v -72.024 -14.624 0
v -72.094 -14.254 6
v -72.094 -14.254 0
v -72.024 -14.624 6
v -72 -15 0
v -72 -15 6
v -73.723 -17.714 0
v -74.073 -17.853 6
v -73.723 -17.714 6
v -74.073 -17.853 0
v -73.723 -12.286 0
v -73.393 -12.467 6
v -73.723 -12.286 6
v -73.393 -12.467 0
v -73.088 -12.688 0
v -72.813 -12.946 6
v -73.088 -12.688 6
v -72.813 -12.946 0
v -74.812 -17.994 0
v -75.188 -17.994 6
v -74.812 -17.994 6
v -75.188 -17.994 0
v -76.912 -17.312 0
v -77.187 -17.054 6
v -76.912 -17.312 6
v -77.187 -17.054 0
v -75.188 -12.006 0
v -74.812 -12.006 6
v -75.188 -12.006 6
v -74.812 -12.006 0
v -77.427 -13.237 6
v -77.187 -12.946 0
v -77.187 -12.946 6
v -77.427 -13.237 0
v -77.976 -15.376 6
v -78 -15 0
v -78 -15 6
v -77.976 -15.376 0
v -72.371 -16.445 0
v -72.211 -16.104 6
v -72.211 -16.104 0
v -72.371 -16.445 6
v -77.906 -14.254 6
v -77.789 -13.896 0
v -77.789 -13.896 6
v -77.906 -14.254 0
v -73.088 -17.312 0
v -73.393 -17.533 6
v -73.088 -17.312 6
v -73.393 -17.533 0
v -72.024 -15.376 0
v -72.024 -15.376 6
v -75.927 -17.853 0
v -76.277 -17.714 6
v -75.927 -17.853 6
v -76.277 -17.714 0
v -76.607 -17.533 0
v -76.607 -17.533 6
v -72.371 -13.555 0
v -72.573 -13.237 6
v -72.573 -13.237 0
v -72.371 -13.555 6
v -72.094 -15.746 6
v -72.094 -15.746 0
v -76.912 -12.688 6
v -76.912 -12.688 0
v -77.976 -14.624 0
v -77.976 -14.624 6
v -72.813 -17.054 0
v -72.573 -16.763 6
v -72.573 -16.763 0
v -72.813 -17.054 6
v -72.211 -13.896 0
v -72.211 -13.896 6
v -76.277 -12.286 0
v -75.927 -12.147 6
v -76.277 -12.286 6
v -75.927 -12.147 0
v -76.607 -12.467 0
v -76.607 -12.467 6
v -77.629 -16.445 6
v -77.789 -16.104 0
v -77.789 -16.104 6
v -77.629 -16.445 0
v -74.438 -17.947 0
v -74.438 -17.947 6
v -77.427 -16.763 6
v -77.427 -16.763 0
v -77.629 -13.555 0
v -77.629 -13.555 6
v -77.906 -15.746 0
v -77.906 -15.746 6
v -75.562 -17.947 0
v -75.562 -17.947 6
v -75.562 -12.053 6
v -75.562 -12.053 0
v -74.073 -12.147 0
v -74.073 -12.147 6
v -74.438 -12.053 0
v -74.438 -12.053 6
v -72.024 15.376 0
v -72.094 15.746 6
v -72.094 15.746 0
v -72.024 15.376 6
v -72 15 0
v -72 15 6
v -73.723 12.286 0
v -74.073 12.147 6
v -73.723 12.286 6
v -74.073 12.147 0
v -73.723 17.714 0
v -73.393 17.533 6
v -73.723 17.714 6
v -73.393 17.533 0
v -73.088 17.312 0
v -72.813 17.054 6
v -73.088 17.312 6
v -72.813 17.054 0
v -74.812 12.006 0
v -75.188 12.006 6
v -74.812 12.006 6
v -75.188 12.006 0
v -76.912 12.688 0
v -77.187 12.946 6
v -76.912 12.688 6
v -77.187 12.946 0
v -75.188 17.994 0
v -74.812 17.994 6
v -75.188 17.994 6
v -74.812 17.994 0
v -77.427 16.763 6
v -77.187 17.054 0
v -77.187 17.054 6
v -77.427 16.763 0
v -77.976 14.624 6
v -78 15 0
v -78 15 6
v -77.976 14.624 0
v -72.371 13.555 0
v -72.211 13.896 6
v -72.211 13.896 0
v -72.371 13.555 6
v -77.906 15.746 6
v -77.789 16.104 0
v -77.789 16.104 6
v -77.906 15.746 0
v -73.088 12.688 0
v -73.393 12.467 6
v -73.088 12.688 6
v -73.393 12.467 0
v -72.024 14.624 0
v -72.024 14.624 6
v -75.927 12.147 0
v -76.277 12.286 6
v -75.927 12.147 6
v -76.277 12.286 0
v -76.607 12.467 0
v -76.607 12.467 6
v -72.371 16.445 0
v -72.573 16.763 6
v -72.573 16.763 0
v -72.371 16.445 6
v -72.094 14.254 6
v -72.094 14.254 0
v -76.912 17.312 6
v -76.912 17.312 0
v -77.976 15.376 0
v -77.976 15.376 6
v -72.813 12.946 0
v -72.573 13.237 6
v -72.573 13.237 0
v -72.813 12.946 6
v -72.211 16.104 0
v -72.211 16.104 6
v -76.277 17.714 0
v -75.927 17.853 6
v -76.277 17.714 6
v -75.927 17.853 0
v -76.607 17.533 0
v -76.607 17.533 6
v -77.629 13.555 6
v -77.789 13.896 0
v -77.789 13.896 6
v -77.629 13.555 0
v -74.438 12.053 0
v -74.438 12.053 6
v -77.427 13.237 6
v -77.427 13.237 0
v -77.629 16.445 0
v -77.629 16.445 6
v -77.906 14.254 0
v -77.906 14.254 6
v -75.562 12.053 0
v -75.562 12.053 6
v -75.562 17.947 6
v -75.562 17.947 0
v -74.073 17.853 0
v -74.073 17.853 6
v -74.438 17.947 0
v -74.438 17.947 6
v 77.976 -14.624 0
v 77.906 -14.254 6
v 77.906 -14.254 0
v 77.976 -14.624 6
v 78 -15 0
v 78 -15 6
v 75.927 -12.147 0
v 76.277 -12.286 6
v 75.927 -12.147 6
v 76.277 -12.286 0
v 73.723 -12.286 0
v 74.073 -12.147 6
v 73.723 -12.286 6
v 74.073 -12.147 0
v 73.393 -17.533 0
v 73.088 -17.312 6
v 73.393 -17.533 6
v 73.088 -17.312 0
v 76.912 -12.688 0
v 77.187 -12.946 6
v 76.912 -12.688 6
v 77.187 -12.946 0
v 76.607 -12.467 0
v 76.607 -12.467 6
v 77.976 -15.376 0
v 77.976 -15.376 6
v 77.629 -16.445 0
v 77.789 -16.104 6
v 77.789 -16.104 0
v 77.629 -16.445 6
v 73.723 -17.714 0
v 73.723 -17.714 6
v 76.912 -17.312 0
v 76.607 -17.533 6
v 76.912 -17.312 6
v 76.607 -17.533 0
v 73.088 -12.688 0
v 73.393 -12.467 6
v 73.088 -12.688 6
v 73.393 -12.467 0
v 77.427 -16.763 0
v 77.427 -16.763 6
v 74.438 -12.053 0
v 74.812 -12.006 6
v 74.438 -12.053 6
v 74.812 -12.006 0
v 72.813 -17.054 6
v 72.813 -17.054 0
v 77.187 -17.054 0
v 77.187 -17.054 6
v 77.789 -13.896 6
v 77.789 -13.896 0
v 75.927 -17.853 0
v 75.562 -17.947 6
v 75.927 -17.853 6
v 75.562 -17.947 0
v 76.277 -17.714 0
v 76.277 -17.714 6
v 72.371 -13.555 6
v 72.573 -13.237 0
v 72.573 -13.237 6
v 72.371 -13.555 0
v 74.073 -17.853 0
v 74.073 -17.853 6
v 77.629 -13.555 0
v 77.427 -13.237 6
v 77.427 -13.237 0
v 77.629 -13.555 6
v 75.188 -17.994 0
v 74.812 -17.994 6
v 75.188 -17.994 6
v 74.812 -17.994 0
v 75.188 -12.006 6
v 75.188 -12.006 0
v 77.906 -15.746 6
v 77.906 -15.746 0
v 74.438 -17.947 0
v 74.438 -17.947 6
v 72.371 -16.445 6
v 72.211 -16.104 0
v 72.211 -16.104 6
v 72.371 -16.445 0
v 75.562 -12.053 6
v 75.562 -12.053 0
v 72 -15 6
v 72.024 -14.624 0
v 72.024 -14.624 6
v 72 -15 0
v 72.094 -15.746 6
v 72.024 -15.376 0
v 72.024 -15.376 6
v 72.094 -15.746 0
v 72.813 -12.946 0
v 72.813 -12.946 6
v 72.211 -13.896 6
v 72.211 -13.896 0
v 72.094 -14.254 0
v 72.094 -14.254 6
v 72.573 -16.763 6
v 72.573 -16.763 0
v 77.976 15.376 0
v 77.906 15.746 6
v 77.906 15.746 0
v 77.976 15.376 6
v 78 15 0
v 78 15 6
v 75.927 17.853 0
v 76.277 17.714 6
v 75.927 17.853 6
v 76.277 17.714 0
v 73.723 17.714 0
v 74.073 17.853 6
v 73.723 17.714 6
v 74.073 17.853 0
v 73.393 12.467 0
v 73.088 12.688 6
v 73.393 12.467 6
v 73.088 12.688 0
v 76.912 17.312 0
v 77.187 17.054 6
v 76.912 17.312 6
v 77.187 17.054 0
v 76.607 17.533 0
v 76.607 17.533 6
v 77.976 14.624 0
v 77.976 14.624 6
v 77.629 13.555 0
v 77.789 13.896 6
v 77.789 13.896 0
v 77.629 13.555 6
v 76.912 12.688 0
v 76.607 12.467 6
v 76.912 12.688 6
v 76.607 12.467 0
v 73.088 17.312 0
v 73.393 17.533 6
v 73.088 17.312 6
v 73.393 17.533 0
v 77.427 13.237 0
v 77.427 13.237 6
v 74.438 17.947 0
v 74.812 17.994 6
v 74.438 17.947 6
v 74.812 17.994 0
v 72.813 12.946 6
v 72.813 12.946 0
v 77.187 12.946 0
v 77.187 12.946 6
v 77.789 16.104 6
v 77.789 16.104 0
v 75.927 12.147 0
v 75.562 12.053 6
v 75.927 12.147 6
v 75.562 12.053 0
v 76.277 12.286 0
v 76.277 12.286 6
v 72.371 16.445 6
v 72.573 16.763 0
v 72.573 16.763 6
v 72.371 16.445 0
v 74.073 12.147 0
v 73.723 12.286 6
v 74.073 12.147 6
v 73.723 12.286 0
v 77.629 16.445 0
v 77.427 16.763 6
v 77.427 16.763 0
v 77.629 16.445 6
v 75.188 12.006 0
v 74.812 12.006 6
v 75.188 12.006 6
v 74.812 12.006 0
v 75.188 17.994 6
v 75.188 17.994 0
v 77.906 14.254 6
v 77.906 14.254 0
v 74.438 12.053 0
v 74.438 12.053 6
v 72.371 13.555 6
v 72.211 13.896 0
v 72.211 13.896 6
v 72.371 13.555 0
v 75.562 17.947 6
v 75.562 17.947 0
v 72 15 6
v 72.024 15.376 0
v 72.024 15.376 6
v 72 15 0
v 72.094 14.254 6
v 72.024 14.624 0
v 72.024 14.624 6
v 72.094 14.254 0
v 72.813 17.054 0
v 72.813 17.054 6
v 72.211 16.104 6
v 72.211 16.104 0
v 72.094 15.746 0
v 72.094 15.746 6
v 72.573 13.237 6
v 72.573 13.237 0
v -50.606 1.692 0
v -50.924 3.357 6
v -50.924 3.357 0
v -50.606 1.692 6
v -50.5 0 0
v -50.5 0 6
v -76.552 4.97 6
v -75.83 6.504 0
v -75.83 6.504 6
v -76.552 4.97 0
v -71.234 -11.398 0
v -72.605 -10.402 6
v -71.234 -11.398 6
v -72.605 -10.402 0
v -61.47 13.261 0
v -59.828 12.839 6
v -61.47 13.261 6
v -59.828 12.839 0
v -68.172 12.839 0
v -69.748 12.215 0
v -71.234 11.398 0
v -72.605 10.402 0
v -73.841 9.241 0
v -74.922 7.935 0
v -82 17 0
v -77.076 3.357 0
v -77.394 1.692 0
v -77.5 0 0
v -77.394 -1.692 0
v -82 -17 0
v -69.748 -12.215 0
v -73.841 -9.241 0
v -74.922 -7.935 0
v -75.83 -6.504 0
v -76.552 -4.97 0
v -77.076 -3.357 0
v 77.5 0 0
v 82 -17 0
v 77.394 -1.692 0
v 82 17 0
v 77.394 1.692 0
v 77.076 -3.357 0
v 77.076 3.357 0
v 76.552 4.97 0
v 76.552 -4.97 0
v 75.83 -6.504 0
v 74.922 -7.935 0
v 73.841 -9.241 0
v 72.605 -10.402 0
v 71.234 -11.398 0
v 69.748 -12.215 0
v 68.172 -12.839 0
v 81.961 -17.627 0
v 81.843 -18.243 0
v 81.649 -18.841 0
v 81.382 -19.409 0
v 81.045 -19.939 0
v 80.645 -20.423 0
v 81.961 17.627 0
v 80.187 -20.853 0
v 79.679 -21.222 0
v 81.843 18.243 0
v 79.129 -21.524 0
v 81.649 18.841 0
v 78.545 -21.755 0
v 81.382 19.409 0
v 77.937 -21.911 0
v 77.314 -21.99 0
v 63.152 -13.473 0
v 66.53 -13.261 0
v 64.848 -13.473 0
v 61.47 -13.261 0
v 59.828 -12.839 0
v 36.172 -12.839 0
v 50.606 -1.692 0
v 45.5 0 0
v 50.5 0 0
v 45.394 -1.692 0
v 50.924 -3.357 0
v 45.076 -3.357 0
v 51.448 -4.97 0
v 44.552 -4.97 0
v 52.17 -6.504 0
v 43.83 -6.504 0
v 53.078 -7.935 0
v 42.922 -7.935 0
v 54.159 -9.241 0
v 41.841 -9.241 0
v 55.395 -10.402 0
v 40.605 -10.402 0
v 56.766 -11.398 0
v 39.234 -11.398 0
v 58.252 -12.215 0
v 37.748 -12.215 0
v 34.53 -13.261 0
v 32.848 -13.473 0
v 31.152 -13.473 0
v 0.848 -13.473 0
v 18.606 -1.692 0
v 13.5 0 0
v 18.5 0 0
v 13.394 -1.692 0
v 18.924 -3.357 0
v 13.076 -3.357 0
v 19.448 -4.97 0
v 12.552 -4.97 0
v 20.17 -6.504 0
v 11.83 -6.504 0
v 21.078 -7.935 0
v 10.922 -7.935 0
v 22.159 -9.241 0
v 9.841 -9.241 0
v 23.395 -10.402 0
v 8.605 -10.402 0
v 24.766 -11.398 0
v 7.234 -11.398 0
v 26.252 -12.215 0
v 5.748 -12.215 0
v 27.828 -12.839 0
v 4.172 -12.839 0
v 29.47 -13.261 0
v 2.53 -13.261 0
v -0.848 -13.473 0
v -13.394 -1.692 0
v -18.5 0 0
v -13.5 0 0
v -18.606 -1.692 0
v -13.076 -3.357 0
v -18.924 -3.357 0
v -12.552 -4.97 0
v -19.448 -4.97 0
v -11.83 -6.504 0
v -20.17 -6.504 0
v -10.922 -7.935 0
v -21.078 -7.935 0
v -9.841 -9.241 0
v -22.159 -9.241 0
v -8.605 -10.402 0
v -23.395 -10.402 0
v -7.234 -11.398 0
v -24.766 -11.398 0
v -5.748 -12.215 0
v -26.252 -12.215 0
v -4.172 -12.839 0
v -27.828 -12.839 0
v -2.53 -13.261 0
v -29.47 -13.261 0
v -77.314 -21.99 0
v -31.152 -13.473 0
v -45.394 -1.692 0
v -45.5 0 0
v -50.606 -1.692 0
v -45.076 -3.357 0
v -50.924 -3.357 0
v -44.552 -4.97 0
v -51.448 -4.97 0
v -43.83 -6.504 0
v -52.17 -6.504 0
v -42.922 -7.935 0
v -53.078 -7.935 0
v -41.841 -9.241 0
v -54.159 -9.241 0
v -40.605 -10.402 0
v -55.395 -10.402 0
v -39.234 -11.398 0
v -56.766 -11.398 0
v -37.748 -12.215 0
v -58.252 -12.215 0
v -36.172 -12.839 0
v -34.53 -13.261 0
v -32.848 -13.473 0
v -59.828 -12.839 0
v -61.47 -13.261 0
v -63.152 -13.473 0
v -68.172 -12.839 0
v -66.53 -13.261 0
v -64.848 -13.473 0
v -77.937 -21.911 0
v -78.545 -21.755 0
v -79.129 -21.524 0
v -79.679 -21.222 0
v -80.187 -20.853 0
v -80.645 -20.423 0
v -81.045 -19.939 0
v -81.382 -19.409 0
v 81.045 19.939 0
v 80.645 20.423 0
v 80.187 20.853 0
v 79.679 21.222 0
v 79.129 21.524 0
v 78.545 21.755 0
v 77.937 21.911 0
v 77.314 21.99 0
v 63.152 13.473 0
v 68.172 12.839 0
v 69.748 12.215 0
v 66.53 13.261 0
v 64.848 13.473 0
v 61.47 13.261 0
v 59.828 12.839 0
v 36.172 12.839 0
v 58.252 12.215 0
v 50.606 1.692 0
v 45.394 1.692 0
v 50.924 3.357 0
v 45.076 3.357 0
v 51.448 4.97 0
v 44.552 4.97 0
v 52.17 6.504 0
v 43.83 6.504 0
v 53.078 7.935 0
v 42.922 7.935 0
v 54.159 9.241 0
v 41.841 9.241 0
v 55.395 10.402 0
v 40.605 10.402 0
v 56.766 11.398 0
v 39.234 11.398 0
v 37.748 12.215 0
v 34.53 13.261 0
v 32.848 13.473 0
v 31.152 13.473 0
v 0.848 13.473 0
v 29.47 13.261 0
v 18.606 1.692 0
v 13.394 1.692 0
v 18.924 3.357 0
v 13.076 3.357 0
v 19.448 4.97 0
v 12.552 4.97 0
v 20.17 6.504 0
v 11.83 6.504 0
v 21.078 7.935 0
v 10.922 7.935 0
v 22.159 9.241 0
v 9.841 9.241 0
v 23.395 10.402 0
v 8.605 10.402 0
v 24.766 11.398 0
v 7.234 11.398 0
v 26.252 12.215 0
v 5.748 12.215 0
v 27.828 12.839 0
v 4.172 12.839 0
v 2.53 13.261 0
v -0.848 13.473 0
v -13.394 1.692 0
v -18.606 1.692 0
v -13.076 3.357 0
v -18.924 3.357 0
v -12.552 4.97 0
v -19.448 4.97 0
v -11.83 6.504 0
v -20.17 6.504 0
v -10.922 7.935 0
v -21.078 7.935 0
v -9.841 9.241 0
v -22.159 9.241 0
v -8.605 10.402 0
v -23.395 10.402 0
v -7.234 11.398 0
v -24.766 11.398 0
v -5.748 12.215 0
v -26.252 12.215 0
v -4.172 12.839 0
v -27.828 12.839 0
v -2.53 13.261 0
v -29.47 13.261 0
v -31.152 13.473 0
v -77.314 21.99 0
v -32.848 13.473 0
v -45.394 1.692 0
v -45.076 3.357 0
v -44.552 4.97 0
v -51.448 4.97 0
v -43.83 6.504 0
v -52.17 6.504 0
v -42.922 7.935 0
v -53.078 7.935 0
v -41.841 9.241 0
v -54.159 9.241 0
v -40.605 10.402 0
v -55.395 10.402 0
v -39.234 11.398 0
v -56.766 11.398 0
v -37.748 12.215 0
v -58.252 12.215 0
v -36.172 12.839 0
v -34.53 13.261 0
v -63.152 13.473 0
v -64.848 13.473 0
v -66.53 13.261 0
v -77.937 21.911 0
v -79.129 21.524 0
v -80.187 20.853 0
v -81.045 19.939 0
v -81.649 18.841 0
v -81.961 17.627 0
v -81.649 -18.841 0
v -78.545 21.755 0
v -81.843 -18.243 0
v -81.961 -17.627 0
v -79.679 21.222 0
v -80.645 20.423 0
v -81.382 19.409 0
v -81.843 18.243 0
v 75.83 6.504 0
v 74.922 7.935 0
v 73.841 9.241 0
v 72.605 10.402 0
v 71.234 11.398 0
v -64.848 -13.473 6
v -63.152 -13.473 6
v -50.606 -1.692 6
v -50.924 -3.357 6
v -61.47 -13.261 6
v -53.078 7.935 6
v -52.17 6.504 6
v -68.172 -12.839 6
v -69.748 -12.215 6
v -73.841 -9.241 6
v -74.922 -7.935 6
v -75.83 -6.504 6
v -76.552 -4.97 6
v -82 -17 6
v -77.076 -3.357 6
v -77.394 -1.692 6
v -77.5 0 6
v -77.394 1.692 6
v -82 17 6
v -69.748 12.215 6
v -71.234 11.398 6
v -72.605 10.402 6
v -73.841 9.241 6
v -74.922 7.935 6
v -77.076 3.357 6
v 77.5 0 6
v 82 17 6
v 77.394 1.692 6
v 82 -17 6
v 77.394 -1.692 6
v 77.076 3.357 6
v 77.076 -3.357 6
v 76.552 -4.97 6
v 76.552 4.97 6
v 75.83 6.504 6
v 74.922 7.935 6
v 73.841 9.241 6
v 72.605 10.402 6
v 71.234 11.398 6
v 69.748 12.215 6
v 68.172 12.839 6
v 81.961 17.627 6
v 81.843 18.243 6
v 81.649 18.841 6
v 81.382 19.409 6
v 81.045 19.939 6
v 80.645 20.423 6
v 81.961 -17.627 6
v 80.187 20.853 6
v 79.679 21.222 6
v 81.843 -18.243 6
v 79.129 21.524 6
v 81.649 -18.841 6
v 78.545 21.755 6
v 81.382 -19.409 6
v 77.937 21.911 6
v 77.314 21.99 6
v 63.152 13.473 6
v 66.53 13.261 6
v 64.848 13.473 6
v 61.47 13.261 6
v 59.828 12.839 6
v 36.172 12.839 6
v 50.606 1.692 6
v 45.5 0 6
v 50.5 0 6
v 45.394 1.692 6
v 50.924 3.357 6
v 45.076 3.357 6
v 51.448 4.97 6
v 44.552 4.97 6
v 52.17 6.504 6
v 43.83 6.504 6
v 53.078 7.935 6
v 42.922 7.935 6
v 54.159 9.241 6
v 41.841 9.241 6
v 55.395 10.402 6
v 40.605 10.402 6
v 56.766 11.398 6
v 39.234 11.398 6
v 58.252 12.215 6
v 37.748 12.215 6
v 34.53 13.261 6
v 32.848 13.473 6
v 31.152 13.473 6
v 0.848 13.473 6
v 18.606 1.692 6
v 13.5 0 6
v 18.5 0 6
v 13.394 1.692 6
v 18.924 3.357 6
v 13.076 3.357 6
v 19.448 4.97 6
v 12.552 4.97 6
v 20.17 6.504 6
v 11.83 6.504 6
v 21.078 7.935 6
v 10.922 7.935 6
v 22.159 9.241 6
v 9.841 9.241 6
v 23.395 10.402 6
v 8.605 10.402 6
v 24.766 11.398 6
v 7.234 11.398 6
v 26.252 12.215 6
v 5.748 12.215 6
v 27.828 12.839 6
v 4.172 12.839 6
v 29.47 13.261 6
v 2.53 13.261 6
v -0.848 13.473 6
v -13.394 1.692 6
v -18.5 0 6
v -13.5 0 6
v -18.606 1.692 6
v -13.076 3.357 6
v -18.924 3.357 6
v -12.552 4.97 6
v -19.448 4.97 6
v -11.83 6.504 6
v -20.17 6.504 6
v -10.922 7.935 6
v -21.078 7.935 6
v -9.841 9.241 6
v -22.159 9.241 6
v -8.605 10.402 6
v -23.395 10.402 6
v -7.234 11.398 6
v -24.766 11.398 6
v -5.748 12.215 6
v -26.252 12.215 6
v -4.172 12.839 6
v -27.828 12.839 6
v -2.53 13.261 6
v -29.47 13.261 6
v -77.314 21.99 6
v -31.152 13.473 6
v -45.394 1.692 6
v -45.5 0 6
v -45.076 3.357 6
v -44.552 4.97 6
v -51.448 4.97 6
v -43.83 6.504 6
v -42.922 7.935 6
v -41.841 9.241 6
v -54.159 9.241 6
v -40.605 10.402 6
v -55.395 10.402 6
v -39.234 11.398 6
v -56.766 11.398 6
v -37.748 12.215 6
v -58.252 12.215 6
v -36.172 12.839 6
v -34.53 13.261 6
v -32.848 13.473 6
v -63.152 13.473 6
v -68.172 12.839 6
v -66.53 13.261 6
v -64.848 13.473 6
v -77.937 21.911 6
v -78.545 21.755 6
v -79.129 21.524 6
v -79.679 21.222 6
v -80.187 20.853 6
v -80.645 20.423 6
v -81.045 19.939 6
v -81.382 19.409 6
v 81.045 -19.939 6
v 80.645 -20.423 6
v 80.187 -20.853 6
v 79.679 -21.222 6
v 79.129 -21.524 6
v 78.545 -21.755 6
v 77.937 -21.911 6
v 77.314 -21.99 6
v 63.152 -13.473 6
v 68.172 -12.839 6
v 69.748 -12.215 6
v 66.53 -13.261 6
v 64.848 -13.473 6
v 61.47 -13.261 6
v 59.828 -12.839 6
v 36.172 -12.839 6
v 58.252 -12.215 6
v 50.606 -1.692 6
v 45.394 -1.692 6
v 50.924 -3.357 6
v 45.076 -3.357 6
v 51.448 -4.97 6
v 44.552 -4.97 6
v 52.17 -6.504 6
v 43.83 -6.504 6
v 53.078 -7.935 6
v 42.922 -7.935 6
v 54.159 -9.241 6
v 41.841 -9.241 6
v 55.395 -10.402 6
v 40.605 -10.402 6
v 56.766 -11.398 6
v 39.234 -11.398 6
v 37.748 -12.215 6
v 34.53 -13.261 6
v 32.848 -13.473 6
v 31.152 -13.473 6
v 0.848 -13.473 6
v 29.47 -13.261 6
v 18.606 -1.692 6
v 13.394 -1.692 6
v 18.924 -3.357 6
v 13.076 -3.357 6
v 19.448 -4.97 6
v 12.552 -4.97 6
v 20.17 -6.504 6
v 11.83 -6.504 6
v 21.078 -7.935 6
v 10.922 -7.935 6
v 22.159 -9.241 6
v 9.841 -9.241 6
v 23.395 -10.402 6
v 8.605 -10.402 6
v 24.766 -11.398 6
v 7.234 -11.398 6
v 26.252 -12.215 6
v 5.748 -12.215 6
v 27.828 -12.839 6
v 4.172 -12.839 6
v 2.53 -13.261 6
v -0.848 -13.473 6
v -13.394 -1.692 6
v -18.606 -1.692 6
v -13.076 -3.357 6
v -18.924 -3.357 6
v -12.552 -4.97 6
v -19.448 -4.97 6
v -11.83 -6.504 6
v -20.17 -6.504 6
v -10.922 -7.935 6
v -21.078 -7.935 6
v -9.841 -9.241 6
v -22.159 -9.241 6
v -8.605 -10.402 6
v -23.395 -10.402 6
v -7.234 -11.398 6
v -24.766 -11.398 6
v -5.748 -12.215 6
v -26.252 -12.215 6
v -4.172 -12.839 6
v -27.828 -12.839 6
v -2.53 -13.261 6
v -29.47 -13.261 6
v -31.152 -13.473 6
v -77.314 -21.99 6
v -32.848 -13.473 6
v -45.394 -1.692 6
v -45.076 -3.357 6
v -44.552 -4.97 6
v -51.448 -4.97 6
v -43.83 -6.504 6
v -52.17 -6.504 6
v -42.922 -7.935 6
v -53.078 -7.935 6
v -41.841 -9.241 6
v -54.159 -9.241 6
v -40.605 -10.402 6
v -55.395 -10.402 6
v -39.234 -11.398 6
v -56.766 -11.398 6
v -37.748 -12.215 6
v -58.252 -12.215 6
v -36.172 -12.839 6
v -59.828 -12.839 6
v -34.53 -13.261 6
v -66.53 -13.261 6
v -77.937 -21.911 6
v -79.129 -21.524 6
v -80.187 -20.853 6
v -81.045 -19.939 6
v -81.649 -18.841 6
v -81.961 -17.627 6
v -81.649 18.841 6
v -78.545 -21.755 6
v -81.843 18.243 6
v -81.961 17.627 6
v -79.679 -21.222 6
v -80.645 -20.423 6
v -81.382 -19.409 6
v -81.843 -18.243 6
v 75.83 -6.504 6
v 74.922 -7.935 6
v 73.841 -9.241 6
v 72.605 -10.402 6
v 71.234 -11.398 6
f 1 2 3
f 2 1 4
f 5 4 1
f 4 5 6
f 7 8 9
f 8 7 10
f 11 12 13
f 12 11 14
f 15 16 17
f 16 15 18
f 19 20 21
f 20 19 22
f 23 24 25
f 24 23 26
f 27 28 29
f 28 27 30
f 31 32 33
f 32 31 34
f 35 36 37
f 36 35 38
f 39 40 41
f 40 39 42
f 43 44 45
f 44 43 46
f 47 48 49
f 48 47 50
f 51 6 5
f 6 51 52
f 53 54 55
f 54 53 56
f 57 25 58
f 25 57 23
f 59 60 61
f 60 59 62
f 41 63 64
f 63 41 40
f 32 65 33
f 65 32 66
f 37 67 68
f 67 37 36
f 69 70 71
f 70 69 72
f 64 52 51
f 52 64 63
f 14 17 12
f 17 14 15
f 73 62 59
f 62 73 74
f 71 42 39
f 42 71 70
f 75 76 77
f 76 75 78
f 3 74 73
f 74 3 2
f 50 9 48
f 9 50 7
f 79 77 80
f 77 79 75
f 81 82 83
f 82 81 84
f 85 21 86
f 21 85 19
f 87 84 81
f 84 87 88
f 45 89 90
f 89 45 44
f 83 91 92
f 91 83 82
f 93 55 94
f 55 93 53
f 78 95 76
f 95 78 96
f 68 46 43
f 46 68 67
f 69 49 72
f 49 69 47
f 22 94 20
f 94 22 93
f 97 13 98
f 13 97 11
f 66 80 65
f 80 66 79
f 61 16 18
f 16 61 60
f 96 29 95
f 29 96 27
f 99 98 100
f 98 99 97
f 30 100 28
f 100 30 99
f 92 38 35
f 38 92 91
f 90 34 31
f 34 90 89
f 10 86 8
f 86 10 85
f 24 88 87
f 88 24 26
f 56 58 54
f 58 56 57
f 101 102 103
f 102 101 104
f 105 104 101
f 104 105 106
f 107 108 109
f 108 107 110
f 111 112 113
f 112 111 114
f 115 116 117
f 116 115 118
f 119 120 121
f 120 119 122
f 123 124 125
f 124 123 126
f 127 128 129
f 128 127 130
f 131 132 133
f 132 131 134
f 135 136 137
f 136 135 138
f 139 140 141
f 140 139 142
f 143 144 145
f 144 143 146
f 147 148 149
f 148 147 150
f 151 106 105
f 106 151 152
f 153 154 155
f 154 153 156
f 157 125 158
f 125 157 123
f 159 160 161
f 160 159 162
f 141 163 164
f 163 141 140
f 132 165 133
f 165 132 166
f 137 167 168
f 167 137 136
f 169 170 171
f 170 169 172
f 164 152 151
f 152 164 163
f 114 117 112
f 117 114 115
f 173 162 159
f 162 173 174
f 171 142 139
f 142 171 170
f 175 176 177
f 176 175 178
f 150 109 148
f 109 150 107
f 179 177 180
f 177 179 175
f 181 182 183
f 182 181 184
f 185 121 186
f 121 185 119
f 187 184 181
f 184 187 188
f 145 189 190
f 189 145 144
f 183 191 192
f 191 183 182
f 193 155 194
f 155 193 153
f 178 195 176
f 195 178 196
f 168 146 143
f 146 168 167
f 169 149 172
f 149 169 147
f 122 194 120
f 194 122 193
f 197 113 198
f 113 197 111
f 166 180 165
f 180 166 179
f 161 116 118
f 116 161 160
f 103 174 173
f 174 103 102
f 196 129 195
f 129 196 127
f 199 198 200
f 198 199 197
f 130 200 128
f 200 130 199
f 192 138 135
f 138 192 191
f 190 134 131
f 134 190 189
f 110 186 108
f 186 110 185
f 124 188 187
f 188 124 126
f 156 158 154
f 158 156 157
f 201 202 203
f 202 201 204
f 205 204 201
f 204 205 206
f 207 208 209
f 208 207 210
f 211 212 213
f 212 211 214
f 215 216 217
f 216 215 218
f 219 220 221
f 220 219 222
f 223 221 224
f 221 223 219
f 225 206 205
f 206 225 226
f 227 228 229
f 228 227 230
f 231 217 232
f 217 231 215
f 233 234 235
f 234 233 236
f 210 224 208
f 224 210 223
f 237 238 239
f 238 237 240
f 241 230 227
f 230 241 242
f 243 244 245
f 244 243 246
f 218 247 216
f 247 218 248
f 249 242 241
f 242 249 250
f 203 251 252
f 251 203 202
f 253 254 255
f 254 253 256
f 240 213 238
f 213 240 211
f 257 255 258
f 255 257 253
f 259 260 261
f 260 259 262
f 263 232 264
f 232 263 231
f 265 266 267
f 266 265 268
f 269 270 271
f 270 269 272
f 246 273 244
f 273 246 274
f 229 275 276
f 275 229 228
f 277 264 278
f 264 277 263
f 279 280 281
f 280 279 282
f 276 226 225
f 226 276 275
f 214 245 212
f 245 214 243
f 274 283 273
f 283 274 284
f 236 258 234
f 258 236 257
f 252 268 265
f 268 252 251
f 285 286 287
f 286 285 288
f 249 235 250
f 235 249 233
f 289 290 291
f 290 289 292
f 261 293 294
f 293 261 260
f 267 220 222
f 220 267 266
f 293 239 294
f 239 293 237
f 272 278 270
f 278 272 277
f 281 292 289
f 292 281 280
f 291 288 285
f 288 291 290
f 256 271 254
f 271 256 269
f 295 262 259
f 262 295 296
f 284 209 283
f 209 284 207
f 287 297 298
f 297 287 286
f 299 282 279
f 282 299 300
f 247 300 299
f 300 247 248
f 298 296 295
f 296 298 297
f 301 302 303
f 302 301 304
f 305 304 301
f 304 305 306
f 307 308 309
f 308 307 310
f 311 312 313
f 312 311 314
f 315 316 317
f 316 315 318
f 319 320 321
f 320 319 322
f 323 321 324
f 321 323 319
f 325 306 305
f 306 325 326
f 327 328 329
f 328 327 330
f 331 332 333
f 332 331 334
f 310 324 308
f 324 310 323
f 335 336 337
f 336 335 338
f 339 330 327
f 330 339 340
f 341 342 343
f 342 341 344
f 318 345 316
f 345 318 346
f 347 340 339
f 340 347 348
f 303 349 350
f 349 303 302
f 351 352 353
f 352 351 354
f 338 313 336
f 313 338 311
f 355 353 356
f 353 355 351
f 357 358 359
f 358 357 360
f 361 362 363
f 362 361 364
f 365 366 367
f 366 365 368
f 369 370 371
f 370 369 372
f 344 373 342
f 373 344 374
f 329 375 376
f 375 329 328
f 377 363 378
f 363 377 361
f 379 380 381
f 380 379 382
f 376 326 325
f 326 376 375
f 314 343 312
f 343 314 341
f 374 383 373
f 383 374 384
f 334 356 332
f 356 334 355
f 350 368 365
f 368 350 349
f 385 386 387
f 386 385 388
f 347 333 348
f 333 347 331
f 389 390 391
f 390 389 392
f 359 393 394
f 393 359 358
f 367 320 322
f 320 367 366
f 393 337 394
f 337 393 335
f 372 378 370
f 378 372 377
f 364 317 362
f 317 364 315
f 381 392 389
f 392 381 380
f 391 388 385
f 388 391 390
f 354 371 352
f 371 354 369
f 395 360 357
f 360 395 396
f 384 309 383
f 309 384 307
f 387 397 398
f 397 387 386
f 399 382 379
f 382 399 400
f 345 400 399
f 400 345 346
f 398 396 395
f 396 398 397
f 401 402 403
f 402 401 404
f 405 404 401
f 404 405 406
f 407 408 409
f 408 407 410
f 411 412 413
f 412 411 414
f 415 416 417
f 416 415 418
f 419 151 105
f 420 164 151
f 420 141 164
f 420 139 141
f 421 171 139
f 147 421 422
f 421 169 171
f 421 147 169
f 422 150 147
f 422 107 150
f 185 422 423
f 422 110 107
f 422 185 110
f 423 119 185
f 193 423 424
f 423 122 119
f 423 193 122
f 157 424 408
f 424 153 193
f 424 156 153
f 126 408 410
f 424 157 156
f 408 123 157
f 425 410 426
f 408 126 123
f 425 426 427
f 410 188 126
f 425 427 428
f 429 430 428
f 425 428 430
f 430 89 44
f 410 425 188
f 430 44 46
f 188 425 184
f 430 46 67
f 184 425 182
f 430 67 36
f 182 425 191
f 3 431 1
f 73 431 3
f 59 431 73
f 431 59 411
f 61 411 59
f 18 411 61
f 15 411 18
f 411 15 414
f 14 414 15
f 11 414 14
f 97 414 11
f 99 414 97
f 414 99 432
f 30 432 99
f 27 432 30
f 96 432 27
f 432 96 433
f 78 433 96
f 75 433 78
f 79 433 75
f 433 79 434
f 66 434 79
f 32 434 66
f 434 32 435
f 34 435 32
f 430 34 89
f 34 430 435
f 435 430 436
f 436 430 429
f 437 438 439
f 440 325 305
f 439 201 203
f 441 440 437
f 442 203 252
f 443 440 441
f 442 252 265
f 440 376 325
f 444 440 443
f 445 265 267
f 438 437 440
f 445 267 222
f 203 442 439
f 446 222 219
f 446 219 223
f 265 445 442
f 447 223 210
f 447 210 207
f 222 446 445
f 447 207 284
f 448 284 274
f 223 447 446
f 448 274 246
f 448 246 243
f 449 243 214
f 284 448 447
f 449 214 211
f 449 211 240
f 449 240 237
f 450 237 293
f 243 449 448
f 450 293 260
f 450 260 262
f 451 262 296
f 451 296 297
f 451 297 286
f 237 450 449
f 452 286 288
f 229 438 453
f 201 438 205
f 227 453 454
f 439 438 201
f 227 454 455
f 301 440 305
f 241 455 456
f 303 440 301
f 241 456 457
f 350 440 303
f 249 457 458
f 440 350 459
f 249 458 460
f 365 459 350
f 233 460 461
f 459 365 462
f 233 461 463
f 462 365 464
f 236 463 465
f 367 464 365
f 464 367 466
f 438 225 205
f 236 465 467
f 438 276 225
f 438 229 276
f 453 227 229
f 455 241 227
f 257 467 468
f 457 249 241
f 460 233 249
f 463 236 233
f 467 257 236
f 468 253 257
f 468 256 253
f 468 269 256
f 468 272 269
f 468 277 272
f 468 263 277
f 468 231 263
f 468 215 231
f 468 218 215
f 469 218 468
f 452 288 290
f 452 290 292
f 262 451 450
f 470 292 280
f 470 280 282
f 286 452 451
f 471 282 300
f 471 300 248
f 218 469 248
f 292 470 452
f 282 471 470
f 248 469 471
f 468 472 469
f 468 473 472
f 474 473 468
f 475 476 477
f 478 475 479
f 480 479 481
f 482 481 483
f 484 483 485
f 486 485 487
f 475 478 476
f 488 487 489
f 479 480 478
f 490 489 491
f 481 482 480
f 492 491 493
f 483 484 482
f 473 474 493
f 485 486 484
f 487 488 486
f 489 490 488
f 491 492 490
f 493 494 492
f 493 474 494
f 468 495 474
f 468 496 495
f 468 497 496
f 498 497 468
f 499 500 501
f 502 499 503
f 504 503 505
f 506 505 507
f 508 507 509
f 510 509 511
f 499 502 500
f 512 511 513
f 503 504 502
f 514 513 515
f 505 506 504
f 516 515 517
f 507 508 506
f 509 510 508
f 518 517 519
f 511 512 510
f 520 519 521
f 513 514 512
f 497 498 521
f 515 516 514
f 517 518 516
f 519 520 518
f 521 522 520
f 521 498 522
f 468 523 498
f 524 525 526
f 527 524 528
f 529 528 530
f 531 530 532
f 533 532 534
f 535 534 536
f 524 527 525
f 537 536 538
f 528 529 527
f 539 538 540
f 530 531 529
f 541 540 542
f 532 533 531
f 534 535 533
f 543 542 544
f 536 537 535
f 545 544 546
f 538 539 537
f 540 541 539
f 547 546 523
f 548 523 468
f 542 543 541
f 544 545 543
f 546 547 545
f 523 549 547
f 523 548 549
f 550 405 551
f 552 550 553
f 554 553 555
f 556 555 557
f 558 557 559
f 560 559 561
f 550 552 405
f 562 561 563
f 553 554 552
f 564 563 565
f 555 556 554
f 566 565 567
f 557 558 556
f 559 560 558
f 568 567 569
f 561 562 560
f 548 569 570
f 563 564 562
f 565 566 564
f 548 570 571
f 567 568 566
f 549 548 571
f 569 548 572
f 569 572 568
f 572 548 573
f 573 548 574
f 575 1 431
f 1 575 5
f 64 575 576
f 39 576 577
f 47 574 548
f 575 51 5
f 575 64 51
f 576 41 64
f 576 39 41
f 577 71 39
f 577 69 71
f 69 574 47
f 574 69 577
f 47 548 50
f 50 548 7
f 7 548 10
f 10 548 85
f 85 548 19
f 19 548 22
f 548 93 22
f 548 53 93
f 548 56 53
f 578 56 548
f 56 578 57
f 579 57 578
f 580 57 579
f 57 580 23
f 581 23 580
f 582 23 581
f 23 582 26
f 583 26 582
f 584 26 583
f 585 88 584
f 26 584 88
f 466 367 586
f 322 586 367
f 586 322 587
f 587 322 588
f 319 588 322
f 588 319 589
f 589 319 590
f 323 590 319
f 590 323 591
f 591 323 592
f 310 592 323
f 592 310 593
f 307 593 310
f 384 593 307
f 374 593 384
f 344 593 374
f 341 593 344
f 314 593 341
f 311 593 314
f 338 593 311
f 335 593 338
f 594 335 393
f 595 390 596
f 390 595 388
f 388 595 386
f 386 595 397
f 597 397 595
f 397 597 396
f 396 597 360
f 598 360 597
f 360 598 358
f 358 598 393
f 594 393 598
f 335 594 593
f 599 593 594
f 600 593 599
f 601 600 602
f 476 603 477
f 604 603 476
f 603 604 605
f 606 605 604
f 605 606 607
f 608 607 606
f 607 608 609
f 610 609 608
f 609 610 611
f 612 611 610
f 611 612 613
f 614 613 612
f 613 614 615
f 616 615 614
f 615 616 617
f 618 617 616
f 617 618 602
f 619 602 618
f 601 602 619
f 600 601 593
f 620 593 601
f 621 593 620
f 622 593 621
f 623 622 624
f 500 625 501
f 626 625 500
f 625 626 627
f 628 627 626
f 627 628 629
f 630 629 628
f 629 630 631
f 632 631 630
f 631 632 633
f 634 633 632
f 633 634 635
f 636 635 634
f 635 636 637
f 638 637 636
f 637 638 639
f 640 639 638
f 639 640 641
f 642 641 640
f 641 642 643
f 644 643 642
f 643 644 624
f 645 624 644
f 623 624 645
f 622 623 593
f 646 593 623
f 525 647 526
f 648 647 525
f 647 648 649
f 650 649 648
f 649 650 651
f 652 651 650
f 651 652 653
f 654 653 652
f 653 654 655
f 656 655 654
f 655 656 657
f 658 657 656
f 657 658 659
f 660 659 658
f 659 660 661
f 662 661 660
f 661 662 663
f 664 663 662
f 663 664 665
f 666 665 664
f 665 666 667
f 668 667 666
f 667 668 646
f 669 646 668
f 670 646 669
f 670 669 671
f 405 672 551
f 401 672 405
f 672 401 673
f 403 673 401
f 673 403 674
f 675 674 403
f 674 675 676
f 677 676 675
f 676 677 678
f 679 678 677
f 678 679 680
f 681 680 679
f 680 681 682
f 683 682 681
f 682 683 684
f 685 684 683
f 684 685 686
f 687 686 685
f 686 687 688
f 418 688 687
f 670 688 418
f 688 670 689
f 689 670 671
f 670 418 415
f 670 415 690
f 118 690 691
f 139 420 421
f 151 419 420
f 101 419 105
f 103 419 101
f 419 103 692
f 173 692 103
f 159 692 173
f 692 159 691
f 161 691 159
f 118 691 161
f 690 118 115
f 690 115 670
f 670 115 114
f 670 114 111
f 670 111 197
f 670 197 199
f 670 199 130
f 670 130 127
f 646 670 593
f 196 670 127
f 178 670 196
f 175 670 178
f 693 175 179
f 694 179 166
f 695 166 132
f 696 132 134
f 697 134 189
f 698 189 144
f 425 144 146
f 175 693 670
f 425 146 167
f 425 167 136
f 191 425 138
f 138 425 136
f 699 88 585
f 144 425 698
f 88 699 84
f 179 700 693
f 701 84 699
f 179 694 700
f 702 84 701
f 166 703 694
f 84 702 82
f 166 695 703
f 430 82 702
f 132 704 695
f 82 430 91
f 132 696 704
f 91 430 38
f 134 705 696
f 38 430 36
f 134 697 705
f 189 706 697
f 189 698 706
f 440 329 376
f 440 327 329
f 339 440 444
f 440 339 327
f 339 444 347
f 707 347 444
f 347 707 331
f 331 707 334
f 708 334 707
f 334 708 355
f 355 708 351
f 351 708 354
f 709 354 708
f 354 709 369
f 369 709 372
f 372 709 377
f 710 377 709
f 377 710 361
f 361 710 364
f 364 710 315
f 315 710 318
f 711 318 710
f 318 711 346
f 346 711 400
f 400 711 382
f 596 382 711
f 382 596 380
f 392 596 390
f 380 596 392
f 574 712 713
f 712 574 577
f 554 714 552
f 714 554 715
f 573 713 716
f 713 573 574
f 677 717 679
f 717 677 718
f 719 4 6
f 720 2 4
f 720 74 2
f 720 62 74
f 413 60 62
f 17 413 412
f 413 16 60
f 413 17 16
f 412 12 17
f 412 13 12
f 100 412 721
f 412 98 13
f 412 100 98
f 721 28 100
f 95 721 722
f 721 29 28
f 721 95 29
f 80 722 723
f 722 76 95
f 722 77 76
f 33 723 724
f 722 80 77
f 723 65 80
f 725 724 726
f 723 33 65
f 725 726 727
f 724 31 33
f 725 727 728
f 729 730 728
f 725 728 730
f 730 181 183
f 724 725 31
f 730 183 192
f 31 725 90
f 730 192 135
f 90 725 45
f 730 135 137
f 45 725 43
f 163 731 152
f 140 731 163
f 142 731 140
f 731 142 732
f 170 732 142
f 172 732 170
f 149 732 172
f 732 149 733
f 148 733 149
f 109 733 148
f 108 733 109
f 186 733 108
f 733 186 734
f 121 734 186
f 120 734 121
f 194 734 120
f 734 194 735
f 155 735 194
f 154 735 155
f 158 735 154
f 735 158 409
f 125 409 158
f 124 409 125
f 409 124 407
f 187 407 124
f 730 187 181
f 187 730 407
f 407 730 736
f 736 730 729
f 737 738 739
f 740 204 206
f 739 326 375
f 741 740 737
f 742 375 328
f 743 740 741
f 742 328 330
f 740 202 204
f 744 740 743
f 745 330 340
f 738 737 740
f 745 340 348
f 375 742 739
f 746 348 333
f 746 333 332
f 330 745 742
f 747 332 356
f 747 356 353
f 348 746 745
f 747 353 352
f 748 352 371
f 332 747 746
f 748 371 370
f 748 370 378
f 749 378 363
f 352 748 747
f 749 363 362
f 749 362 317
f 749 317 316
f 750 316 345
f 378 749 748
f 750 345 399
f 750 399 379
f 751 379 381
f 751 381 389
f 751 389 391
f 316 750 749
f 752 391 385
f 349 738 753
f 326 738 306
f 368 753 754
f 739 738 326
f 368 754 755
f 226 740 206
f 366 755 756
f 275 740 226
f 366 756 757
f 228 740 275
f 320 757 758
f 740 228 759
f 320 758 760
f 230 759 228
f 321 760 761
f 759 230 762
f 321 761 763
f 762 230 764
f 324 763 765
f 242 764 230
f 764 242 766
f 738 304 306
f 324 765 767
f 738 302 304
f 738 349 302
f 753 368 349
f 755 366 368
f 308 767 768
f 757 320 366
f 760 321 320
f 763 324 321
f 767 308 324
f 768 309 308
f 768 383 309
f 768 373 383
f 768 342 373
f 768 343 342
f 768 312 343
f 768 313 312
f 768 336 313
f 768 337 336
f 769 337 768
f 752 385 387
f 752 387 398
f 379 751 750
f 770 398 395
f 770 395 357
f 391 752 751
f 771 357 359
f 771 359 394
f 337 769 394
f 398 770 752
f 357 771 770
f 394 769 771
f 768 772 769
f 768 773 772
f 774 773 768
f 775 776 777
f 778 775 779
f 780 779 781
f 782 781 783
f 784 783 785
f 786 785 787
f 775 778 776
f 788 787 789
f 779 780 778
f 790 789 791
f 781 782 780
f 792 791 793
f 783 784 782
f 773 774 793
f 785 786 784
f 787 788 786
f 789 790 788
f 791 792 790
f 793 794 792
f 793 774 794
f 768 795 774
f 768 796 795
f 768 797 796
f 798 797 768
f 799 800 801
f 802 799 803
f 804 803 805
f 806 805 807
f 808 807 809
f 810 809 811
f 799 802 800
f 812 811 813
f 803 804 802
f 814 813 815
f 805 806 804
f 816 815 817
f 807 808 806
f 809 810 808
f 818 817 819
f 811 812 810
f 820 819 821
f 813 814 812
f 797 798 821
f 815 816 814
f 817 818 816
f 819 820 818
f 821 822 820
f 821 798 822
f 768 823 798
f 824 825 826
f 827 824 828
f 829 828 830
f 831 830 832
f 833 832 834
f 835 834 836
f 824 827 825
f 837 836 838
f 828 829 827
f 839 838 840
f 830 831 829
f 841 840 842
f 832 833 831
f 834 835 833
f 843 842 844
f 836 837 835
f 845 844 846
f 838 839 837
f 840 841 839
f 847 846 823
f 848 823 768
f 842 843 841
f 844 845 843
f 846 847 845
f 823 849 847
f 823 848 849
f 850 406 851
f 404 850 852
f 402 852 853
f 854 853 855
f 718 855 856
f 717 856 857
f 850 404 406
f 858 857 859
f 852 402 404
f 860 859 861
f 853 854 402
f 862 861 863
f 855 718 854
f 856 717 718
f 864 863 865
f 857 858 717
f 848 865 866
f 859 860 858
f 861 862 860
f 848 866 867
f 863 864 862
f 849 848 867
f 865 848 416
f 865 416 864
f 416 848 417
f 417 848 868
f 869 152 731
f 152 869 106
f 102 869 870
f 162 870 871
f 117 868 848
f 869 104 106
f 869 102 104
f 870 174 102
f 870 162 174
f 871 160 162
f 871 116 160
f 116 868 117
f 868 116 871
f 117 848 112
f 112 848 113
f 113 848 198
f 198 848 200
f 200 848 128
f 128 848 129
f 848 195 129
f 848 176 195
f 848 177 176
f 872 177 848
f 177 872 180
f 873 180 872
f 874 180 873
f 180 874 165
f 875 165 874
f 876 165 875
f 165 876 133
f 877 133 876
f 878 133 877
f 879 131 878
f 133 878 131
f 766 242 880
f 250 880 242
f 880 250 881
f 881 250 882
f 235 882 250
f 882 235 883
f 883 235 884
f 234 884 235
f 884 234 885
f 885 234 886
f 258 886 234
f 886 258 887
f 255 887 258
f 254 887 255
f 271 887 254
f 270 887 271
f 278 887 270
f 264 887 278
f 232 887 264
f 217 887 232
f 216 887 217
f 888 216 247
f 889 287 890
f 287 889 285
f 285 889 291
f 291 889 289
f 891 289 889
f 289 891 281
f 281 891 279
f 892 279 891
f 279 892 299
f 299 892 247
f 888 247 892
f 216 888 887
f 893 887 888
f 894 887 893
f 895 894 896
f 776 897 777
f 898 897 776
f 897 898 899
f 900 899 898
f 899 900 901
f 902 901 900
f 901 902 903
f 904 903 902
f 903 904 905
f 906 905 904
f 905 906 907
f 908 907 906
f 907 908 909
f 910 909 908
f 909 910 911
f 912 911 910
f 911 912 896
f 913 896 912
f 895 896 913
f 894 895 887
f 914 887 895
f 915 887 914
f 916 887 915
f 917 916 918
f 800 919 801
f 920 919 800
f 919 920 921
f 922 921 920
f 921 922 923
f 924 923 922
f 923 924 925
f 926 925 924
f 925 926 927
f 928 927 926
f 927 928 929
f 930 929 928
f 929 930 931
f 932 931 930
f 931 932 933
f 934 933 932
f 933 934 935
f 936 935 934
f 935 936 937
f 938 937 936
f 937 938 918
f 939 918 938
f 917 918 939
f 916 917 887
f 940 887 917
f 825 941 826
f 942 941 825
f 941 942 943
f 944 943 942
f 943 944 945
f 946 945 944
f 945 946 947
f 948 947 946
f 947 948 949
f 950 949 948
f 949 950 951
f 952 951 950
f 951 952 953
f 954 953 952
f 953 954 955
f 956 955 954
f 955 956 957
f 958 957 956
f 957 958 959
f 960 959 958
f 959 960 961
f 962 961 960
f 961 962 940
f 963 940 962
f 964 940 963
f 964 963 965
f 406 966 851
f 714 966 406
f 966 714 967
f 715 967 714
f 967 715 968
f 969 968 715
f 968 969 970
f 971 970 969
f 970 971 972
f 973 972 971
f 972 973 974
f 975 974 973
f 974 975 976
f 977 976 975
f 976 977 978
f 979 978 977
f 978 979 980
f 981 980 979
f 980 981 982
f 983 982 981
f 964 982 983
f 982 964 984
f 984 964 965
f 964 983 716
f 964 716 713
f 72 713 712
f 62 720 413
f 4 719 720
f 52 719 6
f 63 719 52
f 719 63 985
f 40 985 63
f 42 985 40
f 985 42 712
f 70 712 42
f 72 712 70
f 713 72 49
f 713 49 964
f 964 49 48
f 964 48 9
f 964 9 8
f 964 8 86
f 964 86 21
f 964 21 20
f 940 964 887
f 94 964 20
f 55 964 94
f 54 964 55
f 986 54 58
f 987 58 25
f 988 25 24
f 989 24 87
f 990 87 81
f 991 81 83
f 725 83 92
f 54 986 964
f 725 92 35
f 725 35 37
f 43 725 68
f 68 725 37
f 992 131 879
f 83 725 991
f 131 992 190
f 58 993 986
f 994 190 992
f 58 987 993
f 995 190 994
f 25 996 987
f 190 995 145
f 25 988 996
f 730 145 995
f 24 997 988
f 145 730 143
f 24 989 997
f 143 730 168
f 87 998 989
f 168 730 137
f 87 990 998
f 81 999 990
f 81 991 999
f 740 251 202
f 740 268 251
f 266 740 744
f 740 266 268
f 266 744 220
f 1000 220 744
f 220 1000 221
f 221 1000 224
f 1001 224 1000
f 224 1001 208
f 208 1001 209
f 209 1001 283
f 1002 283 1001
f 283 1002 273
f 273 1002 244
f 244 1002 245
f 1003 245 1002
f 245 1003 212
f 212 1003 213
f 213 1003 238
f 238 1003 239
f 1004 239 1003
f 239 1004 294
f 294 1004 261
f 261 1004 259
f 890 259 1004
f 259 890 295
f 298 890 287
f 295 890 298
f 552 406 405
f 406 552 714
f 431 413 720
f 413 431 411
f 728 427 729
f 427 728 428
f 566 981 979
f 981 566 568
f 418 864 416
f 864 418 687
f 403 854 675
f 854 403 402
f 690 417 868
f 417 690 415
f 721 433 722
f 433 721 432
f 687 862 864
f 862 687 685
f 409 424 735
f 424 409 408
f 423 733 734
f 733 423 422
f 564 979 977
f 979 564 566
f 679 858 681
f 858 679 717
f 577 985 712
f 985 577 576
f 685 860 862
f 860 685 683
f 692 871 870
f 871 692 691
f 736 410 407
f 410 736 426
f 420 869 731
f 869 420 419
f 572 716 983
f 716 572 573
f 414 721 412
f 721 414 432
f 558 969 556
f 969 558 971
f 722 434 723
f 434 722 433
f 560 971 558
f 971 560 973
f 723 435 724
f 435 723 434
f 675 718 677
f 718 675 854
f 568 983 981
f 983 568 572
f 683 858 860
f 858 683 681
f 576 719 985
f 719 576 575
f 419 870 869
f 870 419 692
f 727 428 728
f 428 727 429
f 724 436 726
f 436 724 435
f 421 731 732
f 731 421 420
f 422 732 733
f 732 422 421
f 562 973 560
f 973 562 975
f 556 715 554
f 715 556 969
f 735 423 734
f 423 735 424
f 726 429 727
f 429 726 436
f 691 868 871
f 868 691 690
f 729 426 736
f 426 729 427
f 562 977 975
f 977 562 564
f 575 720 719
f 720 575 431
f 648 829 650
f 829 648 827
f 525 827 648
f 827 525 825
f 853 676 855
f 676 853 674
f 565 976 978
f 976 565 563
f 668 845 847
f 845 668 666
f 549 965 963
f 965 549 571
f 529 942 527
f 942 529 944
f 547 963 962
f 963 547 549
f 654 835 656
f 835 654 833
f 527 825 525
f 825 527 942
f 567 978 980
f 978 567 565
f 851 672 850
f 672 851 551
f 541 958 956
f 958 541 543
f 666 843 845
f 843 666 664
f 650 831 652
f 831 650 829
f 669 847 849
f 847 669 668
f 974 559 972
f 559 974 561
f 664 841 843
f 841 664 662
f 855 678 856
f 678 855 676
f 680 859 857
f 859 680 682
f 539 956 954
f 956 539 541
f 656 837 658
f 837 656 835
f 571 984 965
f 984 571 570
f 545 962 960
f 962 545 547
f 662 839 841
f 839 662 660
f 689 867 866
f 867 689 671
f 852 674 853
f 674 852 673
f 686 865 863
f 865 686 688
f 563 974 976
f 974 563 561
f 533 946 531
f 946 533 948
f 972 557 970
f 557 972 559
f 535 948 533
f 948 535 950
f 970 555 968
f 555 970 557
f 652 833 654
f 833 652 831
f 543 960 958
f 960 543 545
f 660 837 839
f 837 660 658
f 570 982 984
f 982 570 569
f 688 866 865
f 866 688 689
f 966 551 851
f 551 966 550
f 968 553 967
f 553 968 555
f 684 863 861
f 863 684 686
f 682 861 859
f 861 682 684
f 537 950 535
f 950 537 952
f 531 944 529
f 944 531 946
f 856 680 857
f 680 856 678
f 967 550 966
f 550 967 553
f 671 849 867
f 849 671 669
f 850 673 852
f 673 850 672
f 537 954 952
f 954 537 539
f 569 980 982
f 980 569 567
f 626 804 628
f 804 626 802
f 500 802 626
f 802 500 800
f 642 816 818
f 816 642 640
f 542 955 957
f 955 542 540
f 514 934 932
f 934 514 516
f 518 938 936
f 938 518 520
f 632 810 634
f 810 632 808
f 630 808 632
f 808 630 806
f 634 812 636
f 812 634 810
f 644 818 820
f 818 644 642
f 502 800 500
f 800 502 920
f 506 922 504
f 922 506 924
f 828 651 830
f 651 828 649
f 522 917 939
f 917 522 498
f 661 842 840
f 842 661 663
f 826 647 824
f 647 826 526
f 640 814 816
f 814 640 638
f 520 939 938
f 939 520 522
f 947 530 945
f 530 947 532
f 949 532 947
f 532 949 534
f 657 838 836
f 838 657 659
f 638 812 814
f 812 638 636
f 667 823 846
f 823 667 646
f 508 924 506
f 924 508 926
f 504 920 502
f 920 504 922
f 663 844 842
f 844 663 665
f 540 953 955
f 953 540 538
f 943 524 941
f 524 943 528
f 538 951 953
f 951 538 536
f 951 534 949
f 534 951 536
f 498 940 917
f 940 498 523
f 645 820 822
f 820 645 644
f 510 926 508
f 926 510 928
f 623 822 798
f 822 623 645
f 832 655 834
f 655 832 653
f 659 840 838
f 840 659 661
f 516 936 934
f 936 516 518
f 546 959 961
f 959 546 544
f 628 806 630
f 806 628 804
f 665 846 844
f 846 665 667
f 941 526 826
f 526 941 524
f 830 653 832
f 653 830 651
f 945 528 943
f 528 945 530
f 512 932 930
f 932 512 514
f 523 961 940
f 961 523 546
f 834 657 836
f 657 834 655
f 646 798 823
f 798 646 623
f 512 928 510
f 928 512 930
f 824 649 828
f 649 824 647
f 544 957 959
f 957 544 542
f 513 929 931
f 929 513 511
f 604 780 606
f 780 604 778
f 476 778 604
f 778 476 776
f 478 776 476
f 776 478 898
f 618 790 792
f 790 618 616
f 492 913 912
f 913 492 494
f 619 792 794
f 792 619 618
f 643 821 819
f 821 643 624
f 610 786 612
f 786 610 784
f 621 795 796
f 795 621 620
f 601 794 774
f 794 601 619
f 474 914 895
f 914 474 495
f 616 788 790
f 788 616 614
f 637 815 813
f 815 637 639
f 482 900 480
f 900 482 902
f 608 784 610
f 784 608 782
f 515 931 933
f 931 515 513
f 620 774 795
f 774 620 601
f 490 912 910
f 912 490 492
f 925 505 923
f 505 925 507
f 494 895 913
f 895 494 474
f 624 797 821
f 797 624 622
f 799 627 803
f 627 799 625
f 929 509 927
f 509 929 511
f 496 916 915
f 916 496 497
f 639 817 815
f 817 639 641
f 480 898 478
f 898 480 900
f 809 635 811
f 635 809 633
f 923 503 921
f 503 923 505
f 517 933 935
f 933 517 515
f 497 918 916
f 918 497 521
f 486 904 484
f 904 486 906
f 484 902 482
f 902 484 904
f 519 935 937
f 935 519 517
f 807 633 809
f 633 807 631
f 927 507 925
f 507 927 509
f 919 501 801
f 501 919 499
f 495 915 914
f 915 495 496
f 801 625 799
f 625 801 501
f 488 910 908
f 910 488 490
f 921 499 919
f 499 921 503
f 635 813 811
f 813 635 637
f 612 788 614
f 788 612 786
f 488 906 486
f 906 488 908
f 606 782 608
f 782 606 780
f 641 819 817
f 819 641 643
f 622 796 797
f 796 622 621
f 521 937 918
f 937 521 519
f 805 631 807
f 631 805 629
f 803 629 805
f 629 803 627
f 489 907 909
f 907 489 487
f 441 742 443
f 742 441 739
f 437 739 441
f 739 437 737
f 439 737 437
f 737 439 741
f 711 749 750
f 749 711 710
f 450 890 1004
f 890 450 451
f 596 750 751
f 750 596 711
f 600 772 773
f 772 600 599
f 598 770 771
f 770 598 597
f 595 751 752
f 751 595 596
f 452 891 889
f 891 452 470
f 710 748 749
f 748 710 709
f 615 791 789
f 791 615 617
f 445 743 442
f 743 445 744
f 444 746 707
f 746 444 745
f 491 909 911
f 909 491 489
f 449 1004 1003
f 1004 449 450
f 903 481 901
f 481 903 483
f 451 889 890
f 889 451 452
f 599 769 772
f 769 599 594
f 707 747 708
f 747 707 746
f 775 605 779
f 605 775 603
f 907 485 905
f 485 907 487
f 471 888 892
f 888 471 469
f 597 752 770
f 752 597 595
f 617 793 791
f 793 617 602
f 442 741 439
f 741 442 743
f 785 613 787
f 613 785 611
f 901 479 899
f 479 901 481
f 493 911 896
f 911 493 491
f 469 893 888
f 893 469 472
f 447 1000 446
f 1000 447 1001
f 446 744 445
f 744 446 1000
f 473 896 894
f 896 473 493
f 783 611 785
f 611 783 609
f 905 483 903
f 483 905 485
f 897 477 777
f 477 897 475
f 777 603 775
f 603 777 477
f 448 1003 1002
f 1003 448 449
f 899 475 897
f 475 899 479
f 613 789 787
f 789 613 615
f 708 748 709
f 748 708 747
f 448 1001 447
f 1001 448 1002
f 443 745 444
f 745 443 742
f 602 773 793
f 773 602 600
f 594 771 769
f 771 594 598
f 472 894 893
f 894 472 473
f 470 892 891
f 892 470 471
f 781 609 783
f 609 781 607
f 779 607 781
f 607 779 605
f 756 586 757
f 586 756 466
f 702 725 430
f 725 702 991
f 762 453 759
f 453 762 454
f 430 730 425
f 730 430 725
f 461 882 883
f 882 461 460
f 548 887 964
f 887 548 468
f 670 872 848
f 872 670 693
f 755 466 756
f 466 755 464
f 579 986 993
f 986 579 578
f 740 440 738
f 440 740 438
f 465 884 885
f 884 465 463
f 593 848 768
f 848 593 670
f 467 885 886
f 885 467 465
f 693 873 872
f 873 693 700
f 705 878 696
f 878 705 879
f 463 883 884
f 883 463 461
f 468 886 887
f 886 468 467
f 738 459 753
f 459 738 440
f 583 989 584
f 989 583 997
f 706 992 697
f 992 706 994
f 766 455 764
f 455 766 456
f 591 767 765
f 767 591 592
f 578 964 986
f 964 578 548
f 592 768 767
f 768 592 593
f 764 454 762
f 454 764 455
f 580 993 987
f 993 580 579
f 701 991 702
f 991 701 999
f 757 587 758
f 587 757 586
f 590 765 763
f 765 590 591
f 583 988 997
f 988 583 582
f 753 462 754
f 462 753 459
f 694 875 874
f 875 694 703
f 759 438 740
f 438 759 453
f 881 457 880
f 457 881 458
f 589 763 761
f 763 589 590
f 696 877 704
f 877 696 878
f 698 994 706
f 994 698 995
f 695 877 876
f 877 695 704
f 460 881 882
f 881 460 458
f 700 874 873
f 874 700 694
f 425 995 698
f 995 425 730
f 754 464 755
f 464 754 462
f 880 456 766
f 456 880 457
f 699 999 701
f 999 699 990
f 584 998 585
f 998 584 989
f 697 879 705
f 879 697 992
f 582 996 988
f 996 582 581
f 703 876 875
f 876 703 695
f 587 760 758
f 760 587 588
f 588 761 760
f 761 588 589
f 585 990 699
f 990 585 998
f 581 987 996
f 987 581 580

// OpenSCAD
$fn = 50;


difference() {
	union() {
		hull() {
			translate(v = [-77.0000000000, 17.0000000000, 0]) {
				cylinder(h = 6, r = 5);
			}
			translate(v = [77.0000000000, 17.0000000000, 0]) {
				cylinder(h = 6, r = 5);
			}
			translate(v = [-77.0000000000, -17.0000000000, 0]) {
				cylinder(h = 6, r = 5);
			}
			translate(v = [77.0000000000, -17.0000000000, 0]) {
				cylinder(h = 6, r = 5);
			}
		}
	}
	union() {
		#translate(v = [-75.0000000000, -15.0000000000, -100.0000000000]) {
			cylinder(h = 200, r = 3.0000000000);
		}
		#translate(v = [-75.0000000000, 15.0000000000, -100.0000000000]) {
			cylinder(h = 200, r = 3.0000000000);
		}
		#translate(v = [75.0000000000, -15.0000000000, -100.0000000000]) {
			cylinder(h = 200, r = 3.0000000000);
		}
		#translate(v = [75.0000000000, 15.0000000000, -100.0000000000]) {
			cylinder(h = 200, r = 3.0000000000);
		}
		#translate(v = [-64.0000000000, 0, 0]) {
			cylinder(h = 6, r = 13.5000000000);
		}
		#translate(v = [-32.0000000000, 0, 0]) {
			cylinder(h = 6, r = 13.5000000000);
		}
		#cylinder(h = 6, r = 13.5000000000);
		#translate(v = [32.0000000000, 0, 0]) {
			cylinder(h = 6, r = 13.5000000000);
		}
		#translate(v = [64.0000000000, 0, 0]) {
			cylinder(h = 6, r = 13.5000000000);
		}
	}
}
